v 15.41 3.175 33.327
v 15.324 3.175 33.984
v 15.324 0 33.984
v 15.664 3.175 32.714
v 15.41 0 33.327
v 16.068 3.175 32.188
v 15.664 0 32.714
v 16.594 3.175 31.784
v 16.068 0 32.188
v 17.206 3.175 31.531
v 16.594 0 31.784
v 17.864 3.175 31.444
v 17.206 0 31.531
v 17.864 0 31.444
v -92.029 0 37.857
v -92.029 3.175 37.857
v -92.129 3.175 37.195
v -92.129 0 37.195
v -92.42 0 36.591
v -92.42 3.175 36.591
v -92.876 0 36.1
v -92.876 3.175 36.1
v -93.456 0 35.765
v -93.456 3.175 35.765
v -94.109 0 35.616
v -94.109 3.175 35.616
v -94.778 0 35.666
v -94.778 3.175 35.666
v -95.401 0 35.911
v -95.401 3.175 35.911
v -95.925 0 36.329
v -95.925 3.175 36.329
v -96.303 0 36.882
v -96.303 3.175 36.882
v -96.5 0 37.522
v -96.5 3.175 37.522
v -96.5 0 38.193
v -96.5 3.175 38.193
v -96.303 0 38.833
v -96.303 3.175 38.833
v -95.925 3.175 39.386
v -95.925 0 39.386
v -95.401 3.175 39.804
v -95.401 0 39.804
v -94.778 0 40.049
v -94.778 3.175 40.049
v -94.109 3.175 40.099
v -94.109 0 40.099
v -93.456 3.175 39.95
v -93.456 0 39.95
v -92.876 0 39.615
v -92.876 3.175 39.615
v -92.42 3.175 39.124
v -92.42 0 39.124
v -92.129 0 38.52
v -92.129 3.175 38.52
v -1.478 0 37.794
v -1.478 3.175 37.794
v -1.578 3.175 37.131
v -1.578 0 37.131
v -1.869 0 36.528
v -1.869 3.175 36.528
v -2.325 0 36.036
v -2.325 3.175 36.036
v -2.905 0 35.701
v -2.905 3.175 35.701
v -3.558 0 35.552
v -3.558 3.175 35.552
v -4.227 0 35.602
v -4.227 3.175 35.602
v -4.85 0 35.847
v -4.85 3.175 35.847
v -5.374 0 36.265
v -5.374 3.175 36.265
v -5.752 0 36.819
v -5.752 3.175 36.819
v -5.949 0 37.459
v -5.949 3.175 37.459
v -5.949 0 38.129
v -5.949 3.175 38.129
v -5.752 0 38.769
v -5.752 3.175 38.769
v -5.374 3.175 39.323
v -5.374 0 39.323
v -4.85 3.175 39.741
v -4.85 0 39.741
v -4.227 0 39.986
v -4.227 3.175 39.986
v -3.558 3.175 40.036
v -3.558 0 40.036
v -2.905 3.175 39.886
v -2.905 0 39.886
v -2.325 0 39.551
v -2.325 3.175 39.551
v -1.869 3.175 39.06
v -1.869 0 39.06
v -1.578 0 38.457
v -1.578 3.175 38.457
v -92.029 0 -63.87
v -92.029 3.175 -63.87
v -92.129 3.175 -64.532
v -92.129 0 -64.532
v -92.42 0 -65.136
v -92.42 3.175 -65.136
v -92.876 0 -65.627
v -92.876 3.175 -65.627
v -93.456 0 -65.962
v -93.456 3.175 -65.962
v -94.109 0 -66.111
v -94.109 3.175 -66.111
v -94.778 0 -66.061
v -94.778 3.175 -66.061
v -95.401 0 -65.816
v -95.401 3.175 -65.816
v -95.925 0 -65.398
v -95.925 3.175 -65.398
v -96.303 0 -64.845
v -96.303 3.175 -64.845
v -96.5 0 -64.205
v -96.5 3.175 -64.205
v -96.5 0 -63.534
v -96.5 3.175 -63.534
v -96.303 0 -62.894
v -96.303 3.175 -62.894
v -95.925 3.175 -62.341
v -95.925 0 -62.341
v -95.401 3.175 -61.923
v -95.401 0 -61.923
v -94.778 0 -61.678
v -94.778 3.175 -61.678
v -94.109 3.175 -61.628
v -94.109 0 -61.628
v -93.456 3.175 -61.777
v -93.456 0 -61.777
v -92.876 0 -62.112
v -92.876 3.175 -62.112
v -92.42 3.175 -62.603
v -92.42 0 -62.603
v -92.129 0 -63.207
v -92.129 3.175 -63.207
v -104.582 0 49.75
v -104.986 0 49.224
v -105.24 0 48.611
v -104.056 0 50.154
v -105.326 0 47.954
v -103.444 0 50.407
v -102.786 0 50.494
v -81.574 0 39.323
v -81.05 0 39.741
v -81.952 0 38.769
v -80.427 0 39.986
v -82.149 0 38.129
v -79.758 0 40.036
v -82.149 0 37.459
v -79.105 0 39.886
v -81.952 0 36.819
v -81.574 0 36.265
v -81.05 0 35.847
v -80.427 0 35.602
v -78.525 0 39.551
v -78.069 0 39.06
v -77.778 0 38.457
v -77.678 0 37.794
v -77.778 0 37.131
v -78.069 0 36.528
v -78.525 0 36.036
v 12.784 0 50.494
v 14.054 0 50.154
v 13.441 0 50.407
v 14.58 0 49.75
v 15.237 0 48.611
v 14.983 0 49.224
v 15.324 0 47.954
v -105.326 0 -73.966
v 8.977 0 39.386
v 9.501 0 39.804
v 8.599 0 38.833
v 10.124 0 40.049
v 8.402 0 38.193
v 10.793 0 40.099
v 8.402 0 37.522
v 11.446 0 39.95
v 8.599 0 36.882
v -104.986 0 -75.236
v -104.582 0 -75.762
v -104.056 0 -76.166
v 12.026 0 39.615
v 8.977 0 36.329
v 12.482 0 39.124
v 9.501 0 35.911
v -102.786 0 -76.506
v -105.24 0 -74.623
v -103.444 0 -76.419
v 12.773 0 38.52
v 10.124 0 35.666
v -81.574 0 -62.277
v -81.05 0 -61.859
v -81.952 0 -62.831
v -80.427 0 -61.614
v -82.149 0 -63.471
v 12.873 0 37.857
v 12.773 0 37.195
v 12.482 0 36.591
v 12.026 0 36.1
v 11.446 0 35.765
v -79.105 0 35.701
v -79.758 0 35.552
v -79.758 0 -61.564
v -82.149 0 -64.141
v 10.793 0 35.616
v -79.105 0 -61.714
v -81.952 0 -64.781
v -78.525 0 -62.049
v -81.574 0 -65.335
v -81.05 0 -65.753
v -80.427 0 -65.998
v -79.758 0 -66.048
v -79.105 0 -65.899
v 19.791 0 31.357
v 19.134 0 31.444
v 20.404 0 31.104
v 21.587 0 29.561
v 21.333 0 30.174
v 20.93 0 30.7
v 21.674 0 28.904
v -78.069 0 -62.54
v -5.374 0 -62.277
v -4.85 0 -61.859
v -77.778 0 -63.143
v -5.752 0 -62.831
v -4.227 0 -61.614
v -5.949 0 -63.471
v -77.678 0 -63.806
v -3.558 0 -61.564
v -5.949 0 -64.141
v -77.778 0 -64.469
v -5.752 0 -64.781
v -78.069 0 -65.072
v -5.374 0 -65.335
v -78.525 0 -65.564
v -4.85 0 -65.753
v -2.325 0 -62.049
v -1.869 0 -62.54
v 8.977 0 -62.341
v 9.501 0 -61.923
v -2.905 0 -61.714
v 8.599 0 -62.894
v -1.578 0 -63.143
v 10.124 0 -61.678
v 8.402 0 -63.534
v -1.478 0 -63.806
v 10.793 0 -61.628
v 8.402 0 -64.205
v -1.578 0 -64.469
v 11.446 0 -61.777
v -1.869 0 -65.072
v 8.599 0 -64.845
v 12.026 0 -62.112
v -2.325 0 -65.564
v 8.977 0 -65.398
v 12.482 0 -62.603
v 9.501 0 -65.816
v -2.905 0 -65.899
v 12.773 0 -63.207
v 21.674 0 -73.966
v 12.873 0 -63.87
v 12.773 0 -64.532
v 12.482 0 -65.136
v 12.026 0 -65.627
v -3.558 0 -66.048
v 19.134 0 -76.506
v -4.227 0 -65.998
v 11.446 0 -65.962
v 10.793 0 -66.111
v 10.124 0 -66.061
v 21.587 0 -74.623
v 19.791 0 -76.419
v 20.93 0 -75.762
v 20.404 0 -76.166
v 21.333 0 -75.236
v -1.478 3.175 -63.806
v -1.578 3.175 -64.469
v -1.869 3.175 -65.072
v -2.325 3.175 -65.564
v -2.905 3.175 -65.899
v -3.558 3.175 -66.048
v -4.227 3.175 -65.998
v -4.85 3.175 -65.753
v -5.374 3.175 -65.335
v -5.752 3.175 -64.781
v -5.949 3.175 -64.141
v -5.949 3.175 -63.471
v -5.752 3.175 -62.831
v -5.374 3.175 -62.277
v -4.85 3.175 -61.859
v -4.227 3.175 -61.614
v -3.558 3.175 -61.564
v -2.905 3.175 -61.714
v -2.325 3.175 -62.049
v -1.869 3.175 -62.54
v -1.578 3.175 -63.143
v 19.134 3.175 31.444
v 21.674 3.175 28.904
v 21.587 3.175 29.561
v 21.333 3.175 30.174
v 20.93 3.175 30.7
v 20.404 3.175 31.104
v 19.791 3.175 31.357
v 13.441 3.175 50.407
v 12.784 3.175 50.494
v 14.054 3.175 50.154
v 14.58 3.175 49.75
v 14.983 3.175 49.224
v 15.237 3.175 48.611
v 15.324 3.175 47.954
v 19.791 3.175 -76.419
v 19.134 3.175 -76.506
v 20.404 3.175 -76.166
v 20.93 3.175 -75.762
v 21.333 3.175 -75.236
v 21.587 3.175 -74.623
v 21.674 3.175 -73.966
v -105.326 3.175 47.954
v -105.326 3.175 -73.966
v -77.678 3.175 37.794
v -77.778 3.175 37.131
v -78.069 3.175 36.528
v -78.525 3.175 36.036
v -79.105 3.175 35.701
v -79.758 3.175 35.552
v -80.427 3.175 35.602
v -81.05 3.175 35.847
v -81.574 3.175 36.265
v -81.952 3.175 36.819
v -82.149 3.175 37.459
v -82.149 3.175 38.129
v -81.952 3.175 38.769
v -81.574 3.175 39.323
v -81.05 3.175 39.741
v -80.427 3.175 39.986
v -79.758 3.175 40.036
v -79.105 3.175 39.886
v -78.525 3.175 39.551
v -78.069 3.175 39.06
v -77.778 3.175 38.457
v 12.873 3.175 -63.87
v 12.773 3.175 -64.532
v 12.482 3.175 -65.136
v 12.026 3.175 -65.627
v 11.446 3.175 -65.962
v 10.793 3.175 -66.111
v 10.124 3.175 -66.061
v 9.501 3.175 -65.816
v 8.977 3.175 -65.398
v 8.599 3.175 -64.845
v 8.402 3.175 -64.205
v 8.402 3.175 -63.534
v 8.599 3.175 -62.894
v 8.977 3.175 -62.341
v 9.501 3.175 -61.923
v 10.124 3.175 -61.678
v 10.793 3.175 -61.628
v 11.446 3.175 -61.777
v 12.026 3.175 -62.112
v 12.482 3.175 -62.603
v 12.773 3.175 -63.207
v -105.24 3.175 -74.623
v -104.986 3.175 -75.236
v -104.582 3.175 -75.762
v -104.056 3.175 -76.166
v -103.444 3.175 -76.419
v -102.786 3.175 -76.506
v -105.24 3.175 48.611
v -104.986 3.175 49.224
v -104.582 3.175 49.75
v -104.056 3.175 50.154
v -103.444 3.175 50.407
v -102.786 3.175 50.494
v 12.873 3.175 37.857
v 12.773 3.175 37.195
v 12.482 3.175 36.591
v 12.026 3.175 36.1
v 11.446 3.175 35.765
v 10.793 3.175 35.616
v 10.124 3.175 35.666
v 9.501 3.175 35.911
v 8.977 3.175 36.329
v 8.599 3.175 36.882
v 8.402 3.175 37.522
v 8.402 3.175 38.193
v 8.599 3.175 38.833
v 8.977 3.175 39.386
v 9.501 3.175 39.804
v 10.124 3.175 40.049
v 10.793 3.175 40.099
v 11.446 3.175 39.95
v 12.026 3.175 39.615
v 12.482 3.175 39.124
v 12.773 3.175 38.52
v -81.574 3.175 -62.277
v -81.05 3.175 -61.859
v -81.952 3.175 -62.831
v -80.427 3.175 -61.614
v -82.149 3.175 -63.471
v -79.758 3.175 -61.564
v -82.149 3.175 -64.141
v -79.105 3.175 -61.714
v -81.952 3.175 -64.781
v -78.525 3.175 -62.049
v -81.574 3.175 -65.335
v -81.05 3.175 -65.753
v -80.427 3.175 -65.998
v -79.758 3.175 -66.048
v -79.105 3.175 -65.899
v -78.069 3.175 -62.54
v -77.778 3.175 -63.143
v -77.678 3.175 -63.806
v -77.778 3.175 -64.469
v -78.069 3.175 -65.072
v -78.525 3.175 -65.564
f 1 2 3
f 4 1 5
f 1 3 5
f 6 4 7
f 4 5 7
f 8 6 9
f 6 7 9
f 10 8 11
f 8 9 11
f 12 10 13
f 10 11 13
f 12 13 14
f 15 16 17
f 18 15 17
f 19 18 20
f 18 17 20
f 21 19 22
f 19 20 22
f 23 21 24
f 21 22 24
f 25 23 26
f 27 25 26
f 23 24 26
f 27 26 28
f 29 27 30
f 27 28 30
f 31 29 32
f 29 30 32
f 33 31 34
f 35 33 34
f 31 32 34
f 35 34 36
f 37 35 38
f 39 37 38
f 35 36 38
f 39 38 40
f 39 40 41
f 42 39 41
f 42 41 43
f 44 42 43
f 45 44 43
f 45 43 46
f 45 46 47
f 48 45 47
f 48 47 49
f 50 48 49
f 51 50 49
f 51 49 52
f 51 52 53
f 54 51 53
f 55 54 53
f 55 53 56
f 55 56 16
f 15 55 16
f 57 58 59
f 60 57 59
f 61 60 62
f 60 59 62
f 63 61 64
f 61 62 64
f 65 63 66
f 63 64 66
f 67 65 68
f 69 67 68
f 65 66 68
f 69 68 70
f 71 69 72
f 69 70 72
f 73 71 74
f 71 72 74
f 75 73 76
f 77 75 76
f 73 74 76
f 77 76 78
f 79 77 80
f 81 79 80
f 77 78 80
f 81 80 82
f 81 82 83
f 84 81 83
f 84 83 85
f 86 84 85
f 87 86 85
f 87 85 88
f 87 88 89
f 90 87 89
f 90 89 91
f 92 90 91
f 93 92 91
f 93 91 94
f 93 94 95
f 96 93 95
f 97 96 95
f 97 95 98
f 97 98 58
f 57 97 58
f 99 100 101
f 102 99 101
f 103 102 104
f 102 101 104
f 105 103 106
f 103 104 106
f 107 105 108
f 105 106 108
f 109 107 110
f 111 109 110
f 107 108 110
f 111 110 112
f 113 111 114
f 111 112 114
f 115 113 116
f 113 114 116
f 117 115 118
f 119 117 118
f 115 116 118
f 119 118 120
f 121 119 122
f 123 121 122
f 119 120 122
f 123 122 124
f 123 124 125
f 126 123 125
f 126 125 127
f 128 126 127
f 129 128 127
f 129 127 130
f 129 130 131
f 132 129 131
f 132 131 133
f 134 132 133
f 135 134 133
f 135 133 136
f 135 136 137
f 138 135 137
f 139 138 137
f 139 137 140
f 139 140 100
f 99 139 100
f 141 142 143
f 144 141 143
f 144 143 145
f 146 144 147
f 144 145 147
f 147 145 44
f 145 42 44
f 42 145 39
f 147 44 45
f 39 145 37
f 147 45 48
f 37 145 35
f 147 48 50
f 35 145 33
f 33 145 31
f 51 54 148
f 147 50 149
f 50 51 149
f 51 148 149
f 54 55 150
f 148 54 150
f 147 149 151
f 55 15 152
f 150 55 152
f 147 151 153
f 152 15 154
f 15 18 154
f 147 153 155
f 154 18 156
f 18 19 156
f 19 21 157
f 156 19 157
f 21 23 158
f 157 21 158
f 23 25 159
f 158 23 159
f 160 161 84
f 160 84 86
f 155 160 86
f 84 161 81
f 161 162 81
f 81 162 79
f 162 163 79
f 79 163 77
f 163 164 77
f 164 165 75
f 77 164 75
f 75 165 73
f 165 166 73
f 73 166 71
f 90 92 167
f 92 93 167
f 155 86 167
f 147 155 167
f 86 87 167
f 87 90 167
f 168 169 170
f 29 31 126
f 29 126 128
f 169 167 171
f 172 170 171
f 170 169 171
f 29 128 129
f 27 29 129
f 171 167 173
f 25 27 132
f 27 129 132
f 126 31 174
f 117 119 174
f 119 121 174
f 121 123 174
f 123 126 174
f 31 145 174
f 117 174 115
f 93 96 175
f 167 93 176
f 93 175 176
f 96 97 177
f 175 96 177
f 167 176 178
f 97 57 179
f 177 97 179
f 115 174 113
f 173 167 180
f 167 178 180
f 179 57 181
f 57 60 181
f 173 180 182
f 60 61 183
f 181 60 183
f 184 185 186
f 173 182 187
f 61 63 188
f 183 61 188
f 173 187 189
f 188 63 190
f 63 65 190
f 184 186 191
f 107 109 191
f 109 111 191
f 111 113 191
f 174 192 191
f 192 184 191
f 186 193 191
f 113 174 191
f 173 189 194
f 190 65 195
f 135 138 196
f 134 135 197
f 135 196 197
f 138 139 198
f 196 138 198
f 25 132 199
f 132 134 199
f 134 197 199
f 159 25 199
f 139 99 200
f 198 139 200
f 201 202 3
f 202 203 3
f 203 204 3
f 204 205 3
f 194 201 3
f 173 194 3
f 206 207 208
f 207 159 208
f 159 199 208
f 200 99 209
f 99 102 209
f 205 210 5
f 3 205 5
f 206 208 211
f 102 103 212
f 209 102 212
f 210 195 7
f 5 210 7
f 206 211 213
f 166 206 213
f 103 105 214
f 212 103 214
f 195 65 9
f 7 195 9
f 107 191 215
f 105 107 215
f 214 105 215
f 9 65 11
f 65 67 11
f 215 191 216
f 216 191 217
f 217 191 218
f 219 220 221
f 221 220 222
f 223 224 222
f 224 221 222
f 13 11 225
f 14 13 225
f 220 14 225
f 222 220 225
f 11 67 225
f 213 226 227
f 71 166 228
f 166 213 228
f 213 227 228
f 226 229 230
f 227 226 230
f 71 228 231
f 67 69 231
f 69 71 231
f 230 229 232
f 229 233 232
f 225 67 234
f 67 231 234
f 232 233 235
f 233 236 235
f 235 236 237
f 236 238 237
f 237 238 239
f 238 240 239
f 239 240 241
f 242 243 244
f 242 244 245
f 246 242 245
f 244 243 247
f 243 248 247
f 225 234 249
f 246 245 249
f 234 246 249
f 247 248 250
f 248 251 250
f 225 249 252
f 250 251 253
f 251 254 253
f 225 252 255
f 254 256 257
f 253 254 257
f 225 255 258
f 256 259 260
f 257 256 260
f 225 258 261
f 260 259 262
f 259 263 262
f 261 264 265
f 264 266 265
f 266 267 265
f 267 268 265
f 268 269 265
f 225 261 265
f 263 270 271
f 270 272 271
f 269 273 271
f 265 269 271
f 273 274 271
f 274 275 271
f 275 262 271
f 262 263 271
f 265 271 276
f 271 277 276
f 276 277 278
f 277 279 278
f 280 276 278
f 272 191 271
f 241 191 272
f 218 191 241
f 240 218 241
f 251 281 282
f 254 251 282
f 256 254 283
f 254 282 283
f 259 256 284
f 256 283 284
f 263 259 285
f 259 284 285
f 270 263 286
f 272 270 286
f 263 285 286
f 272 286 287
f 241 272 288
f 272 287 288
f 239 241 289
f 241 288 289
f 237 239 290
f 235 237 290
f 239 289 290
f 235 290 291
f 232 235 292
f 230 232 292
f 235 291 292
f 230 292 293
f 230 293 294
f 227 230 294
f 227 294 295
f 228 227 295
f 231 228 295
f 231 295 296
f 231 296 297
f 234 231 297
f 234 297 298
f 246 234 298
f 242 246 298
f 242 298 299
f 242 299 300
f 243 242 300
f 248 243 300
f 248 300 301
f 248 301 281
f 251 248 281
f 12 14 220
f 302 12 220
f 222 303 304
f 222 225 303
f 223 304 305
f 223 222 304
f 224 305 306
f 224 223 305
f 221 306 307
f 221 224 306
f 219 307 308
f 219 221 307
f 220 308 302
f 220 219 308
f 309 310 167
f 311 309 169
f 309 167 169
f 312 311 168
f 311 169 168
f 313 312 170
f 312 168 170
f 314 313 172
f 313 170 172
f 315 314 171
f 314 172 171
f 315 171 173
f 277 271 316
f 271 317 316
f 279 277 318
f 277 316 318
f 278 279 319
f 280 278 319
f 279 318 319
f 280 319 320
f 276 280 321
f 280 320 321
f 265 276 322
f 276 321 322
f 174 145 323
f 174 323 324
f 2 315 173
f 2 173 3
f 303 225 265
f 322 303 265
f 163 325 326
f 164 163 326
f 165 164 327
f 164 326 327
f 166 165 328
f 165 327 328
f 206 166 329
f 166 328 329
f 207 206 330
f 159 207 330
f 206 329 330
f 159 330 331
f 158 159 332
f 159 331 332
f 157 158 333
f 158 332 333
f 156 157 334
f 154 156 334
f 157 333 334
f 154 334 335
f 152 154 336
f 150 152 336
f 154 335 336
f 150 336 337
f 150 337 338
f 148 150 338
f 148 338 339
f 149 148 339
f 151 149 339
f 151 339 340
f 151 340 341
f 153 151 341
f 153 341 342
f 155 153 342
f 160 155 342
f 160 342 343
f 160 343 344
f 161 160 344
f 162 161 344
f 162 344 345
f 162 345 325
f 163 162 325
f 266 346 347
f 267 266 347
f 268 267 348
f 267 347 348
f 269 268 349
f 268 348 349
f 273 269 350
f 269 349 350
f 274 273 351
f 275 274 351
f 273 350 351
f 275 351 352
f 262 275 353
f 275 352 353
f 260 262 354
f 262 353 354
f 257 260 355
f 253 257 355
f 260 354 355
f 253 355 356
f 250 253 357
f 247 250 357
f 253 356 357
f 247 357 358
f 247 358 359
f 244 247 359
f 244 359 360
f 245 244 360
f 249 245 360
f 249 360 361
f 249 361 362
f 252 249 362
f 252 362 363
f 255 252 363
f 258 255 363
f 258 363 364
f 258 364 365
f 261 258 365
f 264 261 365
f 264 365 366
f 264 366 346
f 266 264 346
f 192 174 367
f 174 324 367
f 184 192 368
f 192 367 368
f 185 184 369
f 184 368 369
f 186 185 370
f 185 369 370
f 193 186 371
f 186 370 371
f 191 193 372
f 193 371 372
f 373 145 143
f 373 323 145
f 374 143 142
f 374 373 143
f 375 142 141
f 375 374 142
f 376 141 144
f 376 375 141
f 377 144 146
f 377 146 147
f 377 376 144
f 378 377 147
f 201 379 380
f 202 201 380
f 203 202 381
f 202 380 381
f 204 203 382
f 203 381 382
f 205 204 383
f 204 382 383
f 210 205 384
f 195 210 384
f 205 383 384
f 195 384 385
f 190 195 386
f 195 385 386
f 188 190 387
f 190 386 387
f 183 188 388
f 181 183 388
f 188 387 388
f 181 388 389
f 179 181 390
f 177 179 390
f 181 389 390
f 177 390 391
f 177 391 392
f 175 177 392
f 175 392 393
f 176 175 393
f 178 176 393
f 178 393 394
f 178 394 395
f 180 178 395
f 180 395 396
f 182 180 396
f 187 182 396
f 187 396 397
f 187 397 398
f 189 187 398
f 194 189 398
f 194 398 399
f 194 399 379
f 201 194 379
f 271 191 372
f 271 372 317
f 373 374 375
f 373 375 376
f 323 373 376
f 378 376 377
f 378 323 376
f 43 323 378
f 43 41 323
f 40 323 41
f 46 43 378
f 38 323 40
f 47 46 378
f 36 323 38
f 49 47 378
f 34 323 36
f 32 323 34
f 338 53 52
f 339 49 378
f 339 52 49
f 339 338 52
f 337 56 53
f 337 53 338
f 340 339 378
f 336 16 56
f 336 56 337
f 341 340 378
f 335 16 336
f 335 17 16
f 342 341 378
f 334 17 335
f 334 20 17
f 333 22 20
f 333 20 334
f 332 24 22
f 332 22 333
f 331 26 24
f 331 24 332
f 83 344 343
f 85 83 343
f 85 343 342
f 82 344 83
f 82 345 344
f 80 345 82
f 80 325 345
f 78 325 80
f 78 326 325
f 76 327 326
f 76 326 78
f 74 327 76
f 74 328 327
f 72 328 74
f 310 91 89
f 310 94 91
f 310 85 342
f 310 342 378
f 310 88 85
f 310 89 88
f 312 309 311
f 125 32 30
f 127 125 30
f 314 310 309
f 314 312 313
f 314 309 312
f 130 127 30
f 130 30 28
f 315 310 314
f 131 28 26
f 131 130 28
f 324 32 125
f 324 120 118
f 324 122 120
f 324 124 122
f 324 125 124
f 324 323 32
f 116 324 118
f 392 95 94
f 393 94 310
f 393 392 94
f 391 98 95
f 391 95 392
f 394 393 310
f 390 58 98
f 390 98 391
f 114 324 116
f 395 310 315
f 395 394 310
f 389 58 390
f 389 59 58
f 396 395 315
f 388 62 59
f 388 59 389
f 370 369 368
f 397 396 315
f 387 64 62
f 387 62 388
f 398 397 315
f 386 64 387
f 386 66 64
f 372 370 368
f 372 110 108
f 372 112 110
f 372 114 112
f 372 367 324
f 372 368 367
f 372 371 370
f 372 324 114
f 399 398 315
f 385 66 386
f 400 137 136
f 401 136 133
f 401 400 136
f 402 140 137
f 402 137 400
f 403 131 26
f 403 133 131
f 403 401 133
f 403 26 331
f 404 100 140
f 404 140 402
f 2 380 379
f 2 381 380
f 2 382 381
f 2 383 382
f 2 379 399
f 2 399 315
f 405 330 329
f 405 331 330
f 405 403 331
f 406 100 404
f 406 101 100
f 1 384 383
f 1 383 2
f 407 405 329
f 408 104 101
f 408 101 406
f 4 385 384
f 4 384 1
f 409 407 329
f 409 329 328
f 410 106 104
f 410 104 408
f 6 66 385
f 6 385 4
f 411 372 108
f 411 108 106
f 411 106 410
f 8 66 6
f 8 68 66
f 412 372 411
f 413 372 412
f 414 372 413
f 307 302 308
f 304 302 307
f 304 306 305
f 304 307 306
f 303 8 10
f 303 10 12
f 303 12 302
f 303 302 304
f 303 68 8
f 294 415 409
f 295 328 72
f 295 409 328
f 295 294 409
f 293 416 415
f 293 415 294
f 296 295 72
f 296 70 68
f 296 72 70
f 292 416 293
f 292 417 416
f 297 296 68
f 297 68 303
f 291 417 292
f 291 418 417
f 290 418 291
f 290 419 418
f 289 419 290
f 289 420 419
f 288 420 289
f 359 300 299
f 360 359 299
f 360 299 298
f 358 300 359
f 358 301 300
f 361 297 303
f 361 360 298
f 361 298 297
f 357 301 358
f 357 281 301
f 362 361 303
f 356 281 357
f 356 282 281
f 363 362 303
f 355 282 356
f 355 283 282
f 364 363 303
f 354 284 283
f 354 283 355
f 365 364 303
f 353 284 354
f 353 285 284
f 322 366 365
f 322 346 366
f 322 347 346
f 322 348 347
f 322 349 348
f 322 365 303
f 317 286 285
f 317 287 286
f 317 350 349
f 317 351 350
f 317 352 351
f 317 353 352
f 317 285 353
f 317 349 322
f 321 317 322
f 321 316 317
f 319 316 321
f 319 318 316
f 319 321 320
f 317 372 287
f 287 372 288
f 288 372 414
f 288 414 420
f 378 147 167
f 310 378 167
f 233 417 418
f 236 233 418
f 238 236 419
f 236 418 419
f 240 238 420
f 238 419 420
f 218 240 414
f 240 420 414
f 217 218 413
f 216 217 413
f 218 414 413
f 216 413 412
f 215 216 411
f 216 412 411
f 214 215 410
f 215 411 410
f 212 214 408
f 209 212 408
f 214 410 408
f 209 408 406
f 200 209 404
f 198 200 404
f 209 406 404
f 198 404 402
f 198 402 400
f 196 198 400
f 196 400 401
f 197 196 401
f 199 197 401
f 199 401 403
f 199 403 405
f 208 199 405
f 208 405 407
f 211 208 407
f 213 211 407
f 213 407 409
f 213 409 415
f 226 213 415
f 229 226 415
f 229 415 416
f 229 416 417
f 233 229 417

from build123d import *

# Parameters (mm, degrees)
SKETCH1_W                   = 127
SKETCH1_H                   = 127
BOSS_EXTRUDE1_DEPTH         = 3.175
F_16_0_177_DIAMETER_HOLE1_D = 4.4958
F_16_0_177_DIAMETER_HOLE2_D = 4.4958
SKETCH12_W                  = 6.35
SKETCH12_H                  = 19.05
CUT_EXTRUDE1_DEPTH          = 131.218638569
FILLET1_R                   = 2.54


with BuildPart() as part:
    # Sketch1 → Boss-Extrude1 (new body)
    with BuildSketch(Plane(origin=(0, 0, 0), x_dir=(1, 0, 0), z_dir=(0, 1, 0))):
        with Locations((-41.826357018, 13.006024096)):
            Rectangle(SKETCH1_W, SKETCH1_H)
    extrude(amount=BOSS_EXTRUDE1_DEPTH)

    # #16 (0.177) Diameter Hole1 (through all)
    with Locations(Plane(origin=(0, 0, 0), x_dir=(-1, 0, 0), z_dir=(0, -1, 0))):
        with Locations((3.726357018, 63.806024096), (79.926357018, -37.793975904), (79.926357018, 63.806024096), (3.726357018, -37.793975904)):
            Hole(F_16_0_177_DIAMETER_HOLE1_D / 2)

    # #16 (0.177) Diameter Hole2 (through all)
    with Locations(Plane(origin=(0, 0, 0), x_dir=(-1, 0, 0), z_dir=(0, -1, 0))):
        with Locations((-10.624642982, 63.869524096), (94.277357018, -37.857475904), (94.277357018, 63.869524096), (-10.624642982, -37.857475904)):
            Hole(F_16_0_177_DIAMETER_HOLE2_D / 2)

    # Sketch12 → Cut-Extrude1 (cut, through all)
    with BuildSketch(Plane(origin=(0, 3.175, 0), x_dir=(1, 0, 0), z_dir=(0, 1, 0))):
        with Locations((18.498642982, -40.968975904)):
            Rectangle(SKETCH12_W, SKETCH12_H)
    extrude(amount=-CUT_EXTRUDE1_DEPTH, mode=Mode.SUBTRACT)

    # Fillet1
    fillet1_edges = [part.edges().sort_by_distance(p)[0] for p in [
        (15.323642982, 1.5875, 50.493975904),
        (15.323642982, 1.5875, 31.443975904),
        (21.673642982, 1.5875, 31.443975904),
        (-105.326357018, 1.5875, 50.493975904),
        (-105.326357018, 1.5875, -76.506024096),
        (21.673642982, 1.5875, -76.506024096),
    ]]
    fillet(fillet1_edges, radius=FILLET1_R)


solid = part.part
